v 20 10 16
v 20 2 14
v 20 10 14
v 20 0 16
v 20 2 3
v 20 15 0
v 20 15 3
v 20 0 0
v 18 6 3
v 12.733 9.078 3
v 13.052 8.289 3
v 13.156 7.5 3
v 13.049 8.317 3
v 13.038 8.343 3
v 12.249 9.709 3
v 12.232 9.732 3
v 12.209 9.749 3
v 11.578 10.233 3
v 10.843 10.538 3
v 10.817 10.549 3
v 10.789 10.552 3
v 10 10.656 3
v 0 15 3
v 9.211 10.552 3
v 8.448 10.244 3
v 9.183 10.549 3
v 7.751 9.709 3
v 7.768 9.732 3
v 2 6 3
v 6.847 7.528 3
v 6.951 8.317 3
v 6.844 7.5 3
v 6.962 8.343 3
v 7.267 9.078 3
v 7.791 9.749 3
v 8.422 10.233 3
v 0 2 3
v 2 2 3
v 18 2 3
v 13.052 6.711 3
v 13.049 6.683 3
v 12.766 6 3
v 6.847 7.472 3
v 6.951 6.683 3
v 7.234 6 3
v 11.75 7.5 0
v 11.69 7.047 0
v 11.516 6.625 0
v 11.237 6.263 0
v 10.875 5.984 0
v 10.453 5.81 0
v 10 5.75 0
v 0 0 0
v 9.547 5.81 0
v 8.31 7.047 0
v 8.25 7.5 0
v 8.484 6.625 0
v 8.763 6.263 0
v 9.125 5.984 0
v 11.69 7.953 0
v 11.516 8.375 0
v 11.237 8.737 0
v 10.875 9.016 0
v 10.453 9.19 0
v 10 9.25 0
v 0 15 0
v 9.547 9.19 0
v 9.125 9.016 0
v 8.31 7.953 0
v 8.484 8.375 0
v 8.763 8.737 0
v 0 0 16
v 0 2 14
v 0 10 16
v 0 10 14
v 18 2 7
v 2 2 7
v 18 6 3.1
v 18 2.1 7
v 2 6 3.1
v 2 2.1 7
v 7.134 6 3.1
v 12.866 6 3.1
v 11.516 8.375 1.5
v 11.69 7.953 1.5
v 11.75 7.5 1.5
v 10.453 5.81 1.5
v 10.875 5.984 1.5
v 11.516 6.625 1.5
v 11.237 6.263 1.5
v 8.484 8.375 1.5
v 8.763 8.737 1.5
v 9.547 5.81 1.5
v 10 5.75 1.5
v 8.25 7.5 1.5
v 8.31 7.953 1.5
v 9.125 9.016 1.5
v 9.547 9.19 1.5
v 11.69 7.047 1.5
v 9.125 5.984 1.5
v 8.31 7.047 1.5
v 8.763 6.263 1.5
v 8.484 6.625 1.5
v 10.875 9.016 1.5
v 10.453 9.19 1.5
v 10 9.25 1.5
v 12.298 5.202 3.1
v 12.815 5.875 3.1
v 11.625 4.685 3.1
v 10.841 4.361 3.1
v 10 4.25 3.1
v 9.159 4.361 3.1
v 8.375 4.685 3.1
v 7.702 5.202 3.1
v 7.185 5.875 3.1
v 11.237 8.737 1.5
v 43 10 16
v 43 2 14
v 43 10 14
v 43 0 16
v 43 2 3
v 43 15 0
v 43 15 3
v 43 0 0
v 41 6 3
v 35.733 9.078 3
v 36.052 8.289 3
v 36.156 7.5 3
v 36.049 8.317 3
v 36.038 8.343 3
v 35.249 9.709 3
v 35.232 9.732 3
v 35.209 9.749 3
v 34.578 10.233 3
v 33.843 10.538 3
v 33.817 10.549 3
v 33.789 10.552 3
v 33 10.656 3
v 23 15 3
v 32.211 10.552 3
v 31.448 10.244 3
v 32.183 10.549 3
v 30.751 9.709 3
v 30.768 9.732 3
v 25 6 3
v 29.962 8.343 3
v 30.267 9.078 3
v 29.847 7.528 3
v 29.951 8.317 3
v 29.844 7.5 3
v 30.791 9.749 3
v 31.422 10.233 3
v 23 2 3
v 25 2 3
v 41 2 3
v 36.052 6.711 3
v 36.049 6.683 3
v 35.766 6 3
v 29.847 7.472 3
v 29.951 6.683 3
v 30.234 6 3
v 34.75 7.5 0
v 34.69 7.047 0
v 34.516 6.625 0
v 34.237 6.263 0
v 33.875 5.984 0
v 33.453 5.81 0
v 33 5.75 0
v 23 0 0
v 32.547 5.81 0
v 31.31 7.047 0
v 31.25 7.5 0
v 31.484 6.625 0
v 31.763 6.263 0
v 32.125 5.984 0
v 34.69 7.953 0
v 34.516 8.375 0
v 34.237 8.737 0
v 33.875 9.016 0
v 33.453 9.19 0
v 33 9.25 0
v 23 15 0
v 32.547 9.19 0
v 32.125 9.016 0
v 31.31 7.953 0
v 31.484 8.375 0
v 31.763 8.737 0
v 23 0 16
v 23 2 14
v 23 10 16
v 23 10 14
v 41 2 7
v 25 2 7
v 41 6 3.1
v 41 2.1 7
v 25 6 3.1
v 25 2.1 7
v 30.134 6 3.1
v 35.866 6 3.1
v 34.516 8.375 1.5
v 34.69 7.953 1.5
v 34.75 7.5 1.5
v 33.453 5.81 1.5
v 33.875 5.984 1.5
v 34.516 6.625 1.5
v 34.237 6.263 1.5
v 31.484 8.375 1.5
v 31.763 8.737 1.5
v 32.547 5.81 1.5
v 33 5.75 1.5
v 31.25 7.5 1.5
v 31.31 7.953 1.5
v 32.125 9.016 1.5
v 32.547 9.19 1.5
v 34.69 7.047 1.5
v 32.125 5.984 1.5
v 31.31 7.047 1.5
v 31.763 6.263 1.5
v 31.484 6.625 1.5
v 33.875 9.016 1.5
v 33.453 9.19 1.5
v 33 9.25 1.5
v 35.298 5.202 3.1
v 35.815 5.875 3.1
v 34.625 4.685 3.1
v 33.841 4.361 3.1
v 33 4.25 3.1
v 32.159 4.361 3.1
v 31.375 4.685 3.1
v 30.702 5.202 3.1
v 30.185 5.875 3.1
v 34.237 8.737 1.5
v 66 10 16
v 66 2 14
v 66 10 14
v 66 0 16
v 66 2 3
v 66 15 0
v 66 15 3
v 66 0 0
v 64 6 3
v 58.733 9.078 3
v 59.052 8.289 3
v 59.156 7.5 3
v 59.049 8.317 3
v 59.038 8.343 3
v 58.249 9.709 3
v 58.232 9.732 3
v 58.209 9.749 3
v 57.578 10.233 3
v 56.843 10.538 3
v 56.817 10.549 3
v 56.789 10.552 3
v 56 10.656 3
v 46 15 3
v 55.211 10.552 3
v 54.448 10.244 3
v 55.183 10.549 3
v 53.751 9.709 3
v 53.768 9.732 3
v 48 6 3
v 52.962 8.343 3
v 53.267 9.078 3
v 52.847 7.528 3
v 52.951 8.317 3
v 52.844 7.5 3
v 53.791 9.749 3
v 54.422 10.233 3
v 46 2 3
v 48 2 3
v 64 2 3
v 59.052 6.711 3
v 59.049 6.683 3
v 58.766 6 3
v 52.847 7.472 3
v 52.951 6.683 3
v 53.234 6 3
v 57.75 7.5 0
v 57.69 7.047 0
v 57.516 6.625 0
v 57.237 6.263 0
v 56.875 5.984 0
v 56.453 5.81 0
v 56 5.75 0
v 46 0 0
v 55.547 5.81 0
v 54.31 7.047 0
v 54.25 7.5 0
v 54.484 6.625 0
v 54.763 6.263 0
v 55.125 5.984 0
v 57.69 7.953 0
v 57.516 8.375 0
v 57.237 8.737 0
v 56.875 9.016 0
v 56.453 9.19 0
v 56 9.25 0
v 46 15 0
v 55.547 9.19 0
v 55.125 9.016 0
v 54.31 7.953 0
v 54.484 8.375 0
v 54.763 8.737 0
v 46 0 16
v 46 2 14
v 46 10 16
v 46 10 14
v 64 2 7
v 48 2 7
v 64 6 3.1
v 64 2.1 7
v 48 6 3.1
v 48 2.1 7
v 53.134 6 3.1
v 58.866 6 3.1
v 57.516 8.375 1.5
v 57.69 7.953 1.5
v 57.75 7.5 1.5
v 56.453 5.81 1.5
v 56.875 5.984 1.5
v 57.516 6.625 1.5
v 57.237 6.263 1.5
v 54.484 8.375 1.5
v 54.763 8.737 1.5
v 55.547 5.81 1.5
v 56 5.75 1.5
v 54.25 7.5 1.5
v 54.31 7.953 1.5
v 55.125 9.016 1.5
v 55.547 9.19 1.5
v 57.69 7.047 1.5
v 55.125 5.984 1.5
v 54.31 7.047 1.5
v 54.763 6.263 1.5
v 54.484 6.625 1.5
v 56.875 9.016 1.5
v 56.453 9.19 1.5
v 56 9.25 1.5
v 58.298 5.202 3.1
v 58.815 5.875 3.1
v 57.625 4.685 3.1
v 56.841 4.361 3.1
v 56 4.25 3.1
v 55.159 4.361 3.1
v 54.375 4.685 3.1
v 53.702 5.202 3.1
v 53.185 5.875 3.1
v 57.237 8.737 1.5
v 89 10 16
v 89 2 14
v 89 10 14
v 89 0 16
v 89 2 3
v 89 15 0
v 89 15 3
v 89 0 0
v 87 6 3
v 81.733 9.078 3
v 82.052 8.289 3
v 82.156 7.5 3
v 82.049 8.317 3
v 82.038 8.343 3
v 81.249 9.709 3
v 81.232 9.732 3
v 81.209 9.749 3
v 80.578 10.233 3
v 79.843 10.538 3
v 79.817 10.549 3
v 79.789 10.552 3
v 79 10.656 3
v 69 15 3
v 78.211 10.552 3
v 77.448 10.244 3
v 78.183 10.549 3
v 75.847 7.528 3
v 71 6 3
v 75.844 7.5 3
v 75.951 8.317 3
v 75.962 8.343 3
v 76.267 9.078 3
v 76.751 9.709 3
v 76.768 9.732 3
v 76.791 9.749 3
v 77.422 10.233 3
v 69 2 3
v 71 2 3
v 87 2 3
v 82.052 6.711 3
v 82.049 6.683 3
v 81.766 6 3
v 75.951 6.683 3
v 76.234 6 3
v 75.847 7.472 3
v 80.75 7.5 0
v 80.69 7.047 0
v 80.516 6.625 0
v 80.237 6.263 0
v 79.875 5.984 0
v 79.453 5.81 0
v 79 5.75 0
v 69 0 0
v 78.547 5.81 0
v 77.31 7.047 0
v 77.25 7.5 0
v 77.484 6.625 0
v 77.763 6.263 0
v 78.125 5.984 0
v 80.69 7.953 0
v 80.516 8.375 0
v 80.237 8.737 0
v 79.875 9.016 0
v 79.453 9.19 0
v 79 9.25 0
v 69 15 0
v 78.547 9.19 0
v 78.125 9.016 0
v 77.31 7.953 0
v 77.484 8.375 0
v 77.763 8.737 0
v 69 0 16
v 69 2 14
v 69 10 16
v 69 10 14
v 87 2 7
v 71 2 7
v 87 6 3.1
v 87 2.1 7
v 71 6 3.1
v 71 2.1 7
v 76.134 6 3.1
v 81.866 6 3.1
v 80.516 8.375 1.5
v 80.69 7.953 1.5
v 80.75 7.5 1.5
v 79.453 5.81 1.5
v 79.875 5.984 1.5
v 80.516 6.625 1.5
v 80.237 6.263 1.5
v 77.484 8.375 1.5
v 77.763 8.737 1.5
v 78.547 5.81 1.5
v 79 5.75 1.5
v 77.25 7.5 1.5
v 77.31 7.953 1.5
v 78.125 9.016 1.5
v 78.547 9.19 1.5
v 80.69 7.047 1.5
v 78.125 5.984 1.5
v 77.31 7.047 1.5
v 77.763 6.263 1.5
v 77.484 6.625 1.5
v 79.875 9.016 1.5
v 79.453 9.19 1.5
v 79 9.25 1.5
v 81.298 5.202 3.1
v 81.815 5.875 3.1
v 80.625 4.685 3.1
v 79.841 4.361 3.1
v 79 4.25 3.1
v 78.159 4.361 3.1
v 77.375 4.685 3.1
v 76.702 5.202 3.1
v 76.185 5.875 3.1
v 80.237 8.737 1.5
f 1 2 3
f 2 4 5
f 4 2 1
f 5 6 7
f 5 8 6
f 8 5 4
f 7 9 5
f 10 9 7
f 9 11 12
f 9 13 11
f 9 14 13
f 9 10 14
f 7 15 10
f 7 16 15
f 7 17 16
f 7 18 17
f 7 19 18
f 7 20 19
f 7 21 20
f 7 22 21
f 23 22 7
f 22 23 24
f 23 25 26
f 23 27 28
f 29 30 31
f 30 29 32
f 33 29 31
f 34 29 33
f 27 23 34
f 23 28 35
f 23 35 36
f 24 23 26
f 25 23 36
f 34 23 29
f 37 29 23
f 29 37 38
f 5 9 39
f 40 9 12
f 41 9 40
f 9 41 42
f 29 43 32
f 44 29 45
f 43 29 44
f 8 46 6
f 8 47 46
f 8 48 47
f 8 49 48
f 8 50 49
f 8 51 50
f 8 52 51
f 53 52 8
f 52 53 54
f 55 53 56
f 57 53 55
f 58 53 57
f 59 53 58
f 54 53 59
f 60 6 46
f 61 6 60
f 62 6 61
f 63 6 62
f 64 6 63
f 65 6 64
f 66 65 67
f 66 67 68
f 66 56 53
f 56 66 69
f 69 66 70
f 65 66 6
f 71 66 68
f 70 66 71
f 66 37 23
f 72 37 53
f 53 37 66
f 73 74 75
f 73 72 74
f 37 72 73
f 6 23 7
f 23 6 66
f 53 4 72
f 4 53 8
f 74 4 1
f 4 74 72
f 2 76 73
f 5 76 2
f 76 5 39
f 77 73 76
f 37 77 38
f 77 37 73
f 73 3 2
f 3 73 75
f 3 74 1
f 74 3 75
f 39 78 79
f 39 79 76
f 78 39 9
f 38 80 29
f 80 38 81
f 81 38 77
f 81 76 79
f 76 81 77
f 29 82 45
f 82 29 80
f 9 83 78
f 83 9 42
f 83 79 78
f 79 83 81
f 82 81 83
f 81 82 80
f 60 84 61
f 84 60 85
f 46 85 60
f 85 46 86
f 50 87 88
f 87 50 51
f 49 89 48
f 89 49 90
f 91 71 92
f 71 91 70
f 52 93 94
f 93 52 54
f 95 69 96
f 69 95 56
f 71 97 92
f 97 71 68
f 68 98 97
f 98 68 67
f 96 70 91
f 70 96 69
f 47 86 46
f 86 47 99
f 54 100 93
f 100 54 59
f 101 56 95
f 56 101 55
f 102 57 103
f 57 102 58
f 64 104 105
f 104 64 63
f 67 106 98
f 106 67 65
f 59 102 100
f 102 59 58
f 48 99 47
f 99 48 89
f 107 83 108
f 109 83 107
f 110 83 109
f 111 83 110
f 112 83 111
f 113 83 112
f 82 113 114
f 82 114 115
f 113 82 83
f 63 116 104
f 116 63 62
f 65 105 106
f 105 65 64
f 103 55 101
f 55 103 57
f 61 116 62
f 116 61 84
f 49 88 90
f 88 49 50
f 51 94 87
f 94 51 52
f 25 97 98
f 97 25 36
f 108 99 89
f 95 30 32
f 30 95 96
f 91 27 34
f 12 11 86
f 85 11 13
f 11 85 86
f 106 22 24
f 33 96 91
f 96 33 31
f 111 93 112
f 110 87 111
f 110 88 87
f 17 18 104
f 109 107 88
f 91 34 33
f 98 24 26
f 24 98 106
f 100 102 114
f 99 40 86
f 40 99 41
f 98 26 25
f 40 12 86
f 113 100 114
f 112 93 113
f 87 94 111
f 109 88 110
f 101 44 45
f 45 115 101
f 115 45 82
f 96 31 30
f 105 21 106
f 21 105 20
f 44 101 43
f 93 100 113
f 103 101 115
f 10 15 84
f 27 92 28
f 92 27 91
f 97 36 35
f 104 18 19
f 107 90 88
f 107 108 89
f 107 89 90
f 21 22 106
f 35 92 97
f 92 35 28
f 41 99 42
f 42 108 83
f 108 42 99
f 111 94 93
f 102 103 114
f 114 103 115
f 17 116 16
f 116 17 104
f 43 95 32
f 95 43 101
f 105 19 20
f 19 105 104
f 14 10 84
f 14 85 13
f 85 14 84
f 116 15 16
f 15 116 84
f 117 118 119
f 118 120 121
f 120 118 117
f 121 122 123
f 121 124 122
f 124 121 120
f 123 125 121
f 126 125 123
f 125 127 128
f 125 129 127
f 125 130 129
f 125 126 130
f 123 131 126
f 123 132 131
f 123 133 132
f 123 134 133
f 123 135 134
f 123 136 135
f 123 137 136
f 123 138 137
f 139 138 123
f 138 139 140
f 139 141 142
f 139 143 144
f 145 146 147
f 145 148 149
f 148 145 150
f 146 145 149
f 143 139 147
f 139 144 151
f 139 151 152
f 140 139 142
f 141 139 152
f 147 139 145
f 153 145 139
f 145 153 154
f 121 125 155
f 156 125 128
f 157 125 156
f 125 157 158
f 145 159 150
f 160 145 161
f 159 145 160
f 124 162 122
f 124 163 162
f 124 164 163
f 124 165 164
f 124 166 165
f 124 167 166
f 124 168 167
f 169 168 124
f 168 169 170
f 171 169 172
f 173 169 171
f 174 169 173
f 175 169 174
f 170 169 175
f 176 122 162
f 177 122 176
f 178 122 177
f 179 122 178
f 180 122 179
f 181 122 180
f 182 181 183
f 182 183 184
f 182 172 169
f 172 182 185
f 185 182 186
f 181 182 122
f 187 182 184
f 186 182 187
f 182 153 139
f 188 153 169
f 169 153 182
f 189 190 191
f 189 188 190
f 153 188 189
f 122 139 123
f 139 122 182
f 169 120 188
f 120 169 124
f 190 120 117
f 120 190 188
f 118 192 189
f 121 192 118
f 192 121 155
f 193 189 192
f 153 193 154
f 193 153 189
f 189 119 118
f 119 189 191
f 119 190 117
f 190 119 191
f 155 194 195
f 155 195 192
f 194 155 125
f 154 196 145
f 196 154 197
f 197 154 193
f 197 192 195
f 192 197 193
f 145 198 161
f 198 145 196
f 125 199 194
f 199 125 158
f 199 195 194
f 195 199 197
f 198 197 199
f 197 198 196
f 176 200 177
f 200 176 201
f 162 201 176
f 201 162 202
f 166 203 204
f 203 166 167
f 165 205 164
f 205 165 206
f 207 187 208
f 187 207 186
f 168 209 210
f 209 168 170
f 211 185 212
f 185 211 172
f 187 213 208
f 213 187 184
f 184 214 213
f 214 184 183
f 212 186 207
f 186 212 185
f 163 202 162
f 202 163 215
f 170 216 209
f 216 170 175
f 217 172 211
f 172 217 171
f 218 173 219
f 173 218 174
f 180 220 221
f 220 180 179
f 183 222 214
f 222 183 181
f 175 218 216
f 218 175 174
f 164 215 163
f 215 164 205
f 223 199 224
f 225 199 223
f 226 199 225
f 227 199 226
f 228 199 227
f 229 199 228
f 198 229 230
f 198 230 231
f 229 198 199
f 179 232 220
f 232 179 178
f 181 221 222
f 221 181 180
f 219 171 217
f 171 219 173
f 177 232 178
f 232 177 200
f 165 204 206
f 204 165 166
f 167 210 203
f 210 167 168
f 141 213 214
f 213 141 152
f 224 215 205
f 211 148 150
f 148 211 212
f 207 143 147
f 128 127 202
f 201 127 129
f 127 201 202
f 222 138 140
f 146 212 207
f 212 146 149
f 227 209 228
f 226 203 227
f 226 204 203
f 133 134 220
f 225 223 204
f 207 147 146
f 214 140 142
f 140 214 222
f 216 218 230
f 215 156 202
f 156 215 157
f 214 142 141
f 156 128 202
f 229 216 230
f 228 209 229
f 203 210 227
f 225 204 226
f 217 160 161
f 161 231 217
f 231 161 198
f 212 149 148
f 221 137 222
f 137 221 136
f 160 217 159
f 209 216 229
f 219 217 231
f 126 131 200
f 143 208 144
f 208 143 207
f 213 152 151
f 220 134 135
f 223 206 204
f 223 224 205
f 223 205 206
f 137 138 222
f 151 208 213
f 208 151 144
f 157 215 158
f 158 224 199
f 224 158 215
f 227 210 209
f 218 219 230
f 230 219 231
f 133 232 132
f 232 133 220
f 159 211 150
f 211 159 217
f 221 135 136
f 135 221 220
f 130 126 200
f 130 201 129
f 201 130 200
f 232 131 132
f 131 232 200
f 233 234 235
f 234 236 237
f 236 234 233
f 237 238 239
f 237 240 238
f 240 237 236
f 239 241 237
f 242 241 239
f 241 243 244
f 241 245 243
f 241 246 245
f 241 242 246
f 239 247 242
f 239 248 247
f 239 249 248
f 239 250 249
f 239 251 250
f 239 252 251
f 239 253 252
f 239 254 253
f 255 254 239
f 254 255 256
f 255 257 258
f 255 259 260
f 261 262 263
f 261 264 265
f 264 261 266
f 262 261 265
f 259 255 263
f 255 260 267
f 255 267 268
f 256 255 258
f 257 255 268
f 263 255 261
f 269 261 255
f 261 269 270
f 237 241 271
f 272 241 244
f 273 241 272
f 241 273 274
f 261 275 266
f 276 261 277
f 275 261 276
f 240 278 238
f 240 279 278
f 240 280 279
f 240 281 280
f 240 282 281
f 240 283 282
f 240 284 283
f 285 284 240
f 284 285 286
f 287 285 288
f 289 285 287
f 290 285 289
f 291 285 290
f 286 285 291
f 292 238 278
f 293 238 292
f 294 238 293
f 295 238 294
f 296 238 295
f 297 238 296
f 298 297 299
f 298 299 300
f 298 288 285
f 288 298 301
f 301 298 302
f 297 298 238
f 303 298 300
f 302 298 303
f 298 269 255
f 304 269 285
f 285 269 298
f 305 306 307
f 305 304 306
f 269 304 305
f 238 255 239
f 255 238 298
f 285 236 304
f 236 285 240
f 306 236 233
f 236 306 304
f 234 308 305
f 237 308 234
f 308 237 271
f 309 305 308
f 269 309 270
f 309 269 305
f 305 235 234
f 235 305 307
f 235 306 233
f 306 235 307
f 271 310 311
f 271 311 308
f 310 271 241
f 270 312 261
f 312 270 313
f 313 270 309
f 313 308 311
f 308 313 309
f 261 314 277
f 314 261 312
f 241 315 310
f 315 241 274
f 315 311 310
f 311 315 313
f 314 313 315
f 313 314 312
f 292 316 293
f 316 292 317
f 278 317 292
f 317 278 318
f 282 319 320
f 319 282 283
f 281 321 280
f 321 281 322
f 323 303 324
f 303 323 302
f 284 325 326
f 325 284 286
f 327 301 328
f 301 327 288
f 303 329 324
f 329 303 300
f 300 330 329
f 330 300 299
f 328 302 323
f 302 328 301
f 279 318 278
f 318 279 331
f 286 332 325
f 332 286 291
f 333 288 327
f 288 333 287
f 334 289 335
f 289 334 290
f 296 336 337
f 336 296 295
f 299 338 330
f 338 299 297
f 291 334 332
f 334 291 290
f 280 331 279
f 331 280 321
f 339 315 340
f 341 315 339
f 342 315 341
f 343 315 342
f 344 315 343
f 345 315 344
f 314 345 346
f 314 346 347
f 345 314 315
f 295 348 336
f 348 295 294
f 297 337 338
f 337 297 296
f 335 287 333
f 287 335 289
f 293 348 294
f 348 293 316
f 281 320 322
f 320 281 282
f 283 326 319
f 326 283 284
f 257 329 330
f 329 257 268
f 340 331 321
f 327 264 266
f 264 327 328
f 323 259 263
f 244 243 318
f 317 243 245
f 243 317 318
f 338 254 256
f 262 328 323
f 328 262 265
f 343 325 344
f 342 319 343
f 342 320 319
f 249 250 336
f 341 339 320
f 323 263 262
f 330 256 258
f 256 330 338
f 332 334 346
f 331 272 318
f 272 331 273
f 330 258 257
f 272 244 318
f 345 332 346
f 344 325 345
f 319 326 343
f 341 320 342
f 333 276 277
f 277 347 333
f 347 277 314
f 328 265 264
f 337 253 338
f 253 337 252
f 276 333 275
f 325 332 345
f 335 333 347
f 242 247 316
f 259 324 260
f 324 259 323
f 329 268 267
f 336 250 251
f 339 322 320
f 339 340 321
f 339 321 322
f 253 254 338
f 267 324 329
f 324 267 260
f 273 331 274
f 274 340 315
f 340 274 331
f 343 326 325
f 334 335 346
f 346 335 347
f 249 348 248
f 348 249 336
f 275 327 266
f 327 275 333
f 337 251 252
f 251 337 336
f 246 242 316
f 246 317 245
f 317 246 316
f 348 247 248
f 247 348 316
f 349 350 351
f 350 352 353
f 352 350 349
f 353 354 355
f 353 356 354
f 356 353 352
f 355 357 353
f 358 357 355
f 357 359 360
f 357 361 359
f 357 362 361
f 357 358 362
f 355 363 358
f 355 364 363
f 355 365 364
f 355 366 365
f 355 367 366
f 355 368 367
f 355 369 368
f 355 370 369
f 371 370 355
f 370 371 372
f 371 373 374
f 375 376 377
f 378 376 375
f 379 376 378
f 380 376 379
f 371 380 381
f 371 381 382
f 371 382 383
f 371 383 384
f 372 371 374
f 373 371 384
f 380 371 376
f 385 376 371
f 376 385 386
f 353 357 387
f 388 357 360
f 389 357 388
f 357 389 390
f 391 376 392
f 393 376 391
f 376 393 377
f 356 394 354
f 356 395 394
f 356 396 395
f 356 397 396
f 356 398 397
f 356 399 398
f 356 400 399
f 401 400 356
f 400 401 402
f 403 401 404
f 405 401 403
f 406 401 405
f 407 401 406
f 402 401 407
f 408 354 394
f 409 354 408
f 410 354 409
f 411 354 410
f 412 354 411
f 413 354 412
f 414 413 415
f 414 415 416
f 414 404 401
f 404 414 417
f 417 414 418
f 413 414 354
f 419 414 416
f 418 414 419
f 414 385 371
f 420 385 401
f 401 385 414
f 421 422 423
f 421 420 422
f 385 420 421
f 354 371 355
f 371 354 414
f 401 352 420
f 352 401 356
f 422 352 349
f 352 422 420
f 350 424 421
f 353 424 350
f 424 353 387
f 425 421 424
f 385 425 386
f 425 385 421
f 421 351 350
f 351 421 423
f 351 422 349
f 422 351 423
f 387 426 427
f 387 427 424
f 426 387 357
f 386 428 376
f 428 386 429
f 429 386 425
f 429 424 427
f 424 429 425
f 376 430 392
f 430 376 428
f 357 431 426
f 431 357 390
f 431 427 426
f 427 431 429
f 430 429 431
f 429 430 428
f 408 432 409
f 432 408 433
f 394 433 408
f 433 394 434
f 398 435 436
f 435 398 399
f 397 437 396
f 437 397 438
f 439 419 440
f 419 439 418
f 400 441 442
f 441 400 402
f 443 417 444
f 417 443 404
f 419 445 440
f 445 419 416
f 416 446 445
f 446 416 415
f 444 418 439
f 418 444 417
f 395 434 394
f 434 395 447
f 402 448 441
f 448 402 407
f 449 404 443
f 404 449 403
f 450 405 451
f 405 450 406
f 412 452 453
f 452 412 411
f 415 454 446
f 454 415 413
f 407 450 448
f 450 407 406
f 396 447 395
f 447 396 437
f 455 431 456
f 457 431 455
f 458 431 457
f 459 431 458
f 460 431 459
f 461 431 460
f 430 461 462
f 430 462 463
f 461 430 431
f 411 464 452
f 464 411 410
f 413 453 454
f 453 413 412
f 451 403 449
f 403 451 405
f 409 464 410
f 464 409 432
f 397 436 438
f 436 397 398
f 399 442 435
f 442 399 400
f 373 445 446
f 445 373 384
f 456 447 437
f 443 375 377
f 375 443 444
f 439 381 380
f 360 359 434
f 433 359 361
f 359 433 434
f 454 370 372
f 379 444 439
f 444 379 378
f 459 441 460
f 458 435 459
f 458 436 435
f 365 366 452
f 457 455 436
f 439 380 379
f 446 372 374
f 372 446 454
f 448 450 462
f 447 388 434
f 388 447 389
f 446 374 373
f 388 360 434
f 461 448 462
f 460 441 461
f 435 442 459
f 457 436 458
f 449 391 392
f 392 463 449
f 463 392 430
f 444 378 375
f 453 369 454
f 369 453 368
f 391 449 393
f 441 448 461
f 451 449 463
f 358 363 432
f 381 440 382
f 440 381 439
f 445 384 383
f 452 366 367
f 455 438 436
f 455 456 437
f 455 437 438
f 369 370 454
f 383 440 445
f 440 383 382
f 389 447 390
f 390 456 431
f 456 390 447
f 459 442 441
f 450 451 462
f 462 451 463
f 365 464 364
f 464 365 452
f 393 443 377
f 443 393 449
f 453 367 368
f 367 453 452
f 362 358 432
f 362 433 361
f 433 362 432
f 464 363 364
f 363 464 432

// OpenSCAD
// ============================================================
// PRINT: CLIPS RETENÇÃO — WEGA
// 4 unidades — braço 13mm (espessura filtro 10mm + MDF 3mm)
// Mesa: ~92mm × 18mm — cabe na Ender 3 (200×200mm) ✓
// Divisória: 09_DIVISORIA_WEGA — Abertura 223×160mm
// ============================================================
// ⚠️ APENAS 4 CLIPS (topo e base) — sem clips laterais
//    Frame lateral muito estreito (10.5mm)
// Orientação: base na mesa (Z=0), braço+aba para cima
// Infill recomendado: 80-100%
// Material: PETG (melhor) ou PLA
// Parafusos: 4× M3×10mm + 4× porca M3
// ============================================================
// Posições M3 na divisória (coordenadas NC):
//   (82,20)(162,20)(82,220)(162,220)
// ============================================================

use <SNAP_TAMPA.scad>

gap = 3;
ret_w = 20;
ret_d = 15;

// 4 colunas × 1 fileira = 4 clips Wega (braço 13mm)
for (col = [0:3]) {
    translate([col * (ret_w + gap), 0, 0])
        clip_wega();
}

// Guia visual da mesa (não imprime)
%translate([0, 0, -0.5])
    cube([200, 200, 0.1]);
